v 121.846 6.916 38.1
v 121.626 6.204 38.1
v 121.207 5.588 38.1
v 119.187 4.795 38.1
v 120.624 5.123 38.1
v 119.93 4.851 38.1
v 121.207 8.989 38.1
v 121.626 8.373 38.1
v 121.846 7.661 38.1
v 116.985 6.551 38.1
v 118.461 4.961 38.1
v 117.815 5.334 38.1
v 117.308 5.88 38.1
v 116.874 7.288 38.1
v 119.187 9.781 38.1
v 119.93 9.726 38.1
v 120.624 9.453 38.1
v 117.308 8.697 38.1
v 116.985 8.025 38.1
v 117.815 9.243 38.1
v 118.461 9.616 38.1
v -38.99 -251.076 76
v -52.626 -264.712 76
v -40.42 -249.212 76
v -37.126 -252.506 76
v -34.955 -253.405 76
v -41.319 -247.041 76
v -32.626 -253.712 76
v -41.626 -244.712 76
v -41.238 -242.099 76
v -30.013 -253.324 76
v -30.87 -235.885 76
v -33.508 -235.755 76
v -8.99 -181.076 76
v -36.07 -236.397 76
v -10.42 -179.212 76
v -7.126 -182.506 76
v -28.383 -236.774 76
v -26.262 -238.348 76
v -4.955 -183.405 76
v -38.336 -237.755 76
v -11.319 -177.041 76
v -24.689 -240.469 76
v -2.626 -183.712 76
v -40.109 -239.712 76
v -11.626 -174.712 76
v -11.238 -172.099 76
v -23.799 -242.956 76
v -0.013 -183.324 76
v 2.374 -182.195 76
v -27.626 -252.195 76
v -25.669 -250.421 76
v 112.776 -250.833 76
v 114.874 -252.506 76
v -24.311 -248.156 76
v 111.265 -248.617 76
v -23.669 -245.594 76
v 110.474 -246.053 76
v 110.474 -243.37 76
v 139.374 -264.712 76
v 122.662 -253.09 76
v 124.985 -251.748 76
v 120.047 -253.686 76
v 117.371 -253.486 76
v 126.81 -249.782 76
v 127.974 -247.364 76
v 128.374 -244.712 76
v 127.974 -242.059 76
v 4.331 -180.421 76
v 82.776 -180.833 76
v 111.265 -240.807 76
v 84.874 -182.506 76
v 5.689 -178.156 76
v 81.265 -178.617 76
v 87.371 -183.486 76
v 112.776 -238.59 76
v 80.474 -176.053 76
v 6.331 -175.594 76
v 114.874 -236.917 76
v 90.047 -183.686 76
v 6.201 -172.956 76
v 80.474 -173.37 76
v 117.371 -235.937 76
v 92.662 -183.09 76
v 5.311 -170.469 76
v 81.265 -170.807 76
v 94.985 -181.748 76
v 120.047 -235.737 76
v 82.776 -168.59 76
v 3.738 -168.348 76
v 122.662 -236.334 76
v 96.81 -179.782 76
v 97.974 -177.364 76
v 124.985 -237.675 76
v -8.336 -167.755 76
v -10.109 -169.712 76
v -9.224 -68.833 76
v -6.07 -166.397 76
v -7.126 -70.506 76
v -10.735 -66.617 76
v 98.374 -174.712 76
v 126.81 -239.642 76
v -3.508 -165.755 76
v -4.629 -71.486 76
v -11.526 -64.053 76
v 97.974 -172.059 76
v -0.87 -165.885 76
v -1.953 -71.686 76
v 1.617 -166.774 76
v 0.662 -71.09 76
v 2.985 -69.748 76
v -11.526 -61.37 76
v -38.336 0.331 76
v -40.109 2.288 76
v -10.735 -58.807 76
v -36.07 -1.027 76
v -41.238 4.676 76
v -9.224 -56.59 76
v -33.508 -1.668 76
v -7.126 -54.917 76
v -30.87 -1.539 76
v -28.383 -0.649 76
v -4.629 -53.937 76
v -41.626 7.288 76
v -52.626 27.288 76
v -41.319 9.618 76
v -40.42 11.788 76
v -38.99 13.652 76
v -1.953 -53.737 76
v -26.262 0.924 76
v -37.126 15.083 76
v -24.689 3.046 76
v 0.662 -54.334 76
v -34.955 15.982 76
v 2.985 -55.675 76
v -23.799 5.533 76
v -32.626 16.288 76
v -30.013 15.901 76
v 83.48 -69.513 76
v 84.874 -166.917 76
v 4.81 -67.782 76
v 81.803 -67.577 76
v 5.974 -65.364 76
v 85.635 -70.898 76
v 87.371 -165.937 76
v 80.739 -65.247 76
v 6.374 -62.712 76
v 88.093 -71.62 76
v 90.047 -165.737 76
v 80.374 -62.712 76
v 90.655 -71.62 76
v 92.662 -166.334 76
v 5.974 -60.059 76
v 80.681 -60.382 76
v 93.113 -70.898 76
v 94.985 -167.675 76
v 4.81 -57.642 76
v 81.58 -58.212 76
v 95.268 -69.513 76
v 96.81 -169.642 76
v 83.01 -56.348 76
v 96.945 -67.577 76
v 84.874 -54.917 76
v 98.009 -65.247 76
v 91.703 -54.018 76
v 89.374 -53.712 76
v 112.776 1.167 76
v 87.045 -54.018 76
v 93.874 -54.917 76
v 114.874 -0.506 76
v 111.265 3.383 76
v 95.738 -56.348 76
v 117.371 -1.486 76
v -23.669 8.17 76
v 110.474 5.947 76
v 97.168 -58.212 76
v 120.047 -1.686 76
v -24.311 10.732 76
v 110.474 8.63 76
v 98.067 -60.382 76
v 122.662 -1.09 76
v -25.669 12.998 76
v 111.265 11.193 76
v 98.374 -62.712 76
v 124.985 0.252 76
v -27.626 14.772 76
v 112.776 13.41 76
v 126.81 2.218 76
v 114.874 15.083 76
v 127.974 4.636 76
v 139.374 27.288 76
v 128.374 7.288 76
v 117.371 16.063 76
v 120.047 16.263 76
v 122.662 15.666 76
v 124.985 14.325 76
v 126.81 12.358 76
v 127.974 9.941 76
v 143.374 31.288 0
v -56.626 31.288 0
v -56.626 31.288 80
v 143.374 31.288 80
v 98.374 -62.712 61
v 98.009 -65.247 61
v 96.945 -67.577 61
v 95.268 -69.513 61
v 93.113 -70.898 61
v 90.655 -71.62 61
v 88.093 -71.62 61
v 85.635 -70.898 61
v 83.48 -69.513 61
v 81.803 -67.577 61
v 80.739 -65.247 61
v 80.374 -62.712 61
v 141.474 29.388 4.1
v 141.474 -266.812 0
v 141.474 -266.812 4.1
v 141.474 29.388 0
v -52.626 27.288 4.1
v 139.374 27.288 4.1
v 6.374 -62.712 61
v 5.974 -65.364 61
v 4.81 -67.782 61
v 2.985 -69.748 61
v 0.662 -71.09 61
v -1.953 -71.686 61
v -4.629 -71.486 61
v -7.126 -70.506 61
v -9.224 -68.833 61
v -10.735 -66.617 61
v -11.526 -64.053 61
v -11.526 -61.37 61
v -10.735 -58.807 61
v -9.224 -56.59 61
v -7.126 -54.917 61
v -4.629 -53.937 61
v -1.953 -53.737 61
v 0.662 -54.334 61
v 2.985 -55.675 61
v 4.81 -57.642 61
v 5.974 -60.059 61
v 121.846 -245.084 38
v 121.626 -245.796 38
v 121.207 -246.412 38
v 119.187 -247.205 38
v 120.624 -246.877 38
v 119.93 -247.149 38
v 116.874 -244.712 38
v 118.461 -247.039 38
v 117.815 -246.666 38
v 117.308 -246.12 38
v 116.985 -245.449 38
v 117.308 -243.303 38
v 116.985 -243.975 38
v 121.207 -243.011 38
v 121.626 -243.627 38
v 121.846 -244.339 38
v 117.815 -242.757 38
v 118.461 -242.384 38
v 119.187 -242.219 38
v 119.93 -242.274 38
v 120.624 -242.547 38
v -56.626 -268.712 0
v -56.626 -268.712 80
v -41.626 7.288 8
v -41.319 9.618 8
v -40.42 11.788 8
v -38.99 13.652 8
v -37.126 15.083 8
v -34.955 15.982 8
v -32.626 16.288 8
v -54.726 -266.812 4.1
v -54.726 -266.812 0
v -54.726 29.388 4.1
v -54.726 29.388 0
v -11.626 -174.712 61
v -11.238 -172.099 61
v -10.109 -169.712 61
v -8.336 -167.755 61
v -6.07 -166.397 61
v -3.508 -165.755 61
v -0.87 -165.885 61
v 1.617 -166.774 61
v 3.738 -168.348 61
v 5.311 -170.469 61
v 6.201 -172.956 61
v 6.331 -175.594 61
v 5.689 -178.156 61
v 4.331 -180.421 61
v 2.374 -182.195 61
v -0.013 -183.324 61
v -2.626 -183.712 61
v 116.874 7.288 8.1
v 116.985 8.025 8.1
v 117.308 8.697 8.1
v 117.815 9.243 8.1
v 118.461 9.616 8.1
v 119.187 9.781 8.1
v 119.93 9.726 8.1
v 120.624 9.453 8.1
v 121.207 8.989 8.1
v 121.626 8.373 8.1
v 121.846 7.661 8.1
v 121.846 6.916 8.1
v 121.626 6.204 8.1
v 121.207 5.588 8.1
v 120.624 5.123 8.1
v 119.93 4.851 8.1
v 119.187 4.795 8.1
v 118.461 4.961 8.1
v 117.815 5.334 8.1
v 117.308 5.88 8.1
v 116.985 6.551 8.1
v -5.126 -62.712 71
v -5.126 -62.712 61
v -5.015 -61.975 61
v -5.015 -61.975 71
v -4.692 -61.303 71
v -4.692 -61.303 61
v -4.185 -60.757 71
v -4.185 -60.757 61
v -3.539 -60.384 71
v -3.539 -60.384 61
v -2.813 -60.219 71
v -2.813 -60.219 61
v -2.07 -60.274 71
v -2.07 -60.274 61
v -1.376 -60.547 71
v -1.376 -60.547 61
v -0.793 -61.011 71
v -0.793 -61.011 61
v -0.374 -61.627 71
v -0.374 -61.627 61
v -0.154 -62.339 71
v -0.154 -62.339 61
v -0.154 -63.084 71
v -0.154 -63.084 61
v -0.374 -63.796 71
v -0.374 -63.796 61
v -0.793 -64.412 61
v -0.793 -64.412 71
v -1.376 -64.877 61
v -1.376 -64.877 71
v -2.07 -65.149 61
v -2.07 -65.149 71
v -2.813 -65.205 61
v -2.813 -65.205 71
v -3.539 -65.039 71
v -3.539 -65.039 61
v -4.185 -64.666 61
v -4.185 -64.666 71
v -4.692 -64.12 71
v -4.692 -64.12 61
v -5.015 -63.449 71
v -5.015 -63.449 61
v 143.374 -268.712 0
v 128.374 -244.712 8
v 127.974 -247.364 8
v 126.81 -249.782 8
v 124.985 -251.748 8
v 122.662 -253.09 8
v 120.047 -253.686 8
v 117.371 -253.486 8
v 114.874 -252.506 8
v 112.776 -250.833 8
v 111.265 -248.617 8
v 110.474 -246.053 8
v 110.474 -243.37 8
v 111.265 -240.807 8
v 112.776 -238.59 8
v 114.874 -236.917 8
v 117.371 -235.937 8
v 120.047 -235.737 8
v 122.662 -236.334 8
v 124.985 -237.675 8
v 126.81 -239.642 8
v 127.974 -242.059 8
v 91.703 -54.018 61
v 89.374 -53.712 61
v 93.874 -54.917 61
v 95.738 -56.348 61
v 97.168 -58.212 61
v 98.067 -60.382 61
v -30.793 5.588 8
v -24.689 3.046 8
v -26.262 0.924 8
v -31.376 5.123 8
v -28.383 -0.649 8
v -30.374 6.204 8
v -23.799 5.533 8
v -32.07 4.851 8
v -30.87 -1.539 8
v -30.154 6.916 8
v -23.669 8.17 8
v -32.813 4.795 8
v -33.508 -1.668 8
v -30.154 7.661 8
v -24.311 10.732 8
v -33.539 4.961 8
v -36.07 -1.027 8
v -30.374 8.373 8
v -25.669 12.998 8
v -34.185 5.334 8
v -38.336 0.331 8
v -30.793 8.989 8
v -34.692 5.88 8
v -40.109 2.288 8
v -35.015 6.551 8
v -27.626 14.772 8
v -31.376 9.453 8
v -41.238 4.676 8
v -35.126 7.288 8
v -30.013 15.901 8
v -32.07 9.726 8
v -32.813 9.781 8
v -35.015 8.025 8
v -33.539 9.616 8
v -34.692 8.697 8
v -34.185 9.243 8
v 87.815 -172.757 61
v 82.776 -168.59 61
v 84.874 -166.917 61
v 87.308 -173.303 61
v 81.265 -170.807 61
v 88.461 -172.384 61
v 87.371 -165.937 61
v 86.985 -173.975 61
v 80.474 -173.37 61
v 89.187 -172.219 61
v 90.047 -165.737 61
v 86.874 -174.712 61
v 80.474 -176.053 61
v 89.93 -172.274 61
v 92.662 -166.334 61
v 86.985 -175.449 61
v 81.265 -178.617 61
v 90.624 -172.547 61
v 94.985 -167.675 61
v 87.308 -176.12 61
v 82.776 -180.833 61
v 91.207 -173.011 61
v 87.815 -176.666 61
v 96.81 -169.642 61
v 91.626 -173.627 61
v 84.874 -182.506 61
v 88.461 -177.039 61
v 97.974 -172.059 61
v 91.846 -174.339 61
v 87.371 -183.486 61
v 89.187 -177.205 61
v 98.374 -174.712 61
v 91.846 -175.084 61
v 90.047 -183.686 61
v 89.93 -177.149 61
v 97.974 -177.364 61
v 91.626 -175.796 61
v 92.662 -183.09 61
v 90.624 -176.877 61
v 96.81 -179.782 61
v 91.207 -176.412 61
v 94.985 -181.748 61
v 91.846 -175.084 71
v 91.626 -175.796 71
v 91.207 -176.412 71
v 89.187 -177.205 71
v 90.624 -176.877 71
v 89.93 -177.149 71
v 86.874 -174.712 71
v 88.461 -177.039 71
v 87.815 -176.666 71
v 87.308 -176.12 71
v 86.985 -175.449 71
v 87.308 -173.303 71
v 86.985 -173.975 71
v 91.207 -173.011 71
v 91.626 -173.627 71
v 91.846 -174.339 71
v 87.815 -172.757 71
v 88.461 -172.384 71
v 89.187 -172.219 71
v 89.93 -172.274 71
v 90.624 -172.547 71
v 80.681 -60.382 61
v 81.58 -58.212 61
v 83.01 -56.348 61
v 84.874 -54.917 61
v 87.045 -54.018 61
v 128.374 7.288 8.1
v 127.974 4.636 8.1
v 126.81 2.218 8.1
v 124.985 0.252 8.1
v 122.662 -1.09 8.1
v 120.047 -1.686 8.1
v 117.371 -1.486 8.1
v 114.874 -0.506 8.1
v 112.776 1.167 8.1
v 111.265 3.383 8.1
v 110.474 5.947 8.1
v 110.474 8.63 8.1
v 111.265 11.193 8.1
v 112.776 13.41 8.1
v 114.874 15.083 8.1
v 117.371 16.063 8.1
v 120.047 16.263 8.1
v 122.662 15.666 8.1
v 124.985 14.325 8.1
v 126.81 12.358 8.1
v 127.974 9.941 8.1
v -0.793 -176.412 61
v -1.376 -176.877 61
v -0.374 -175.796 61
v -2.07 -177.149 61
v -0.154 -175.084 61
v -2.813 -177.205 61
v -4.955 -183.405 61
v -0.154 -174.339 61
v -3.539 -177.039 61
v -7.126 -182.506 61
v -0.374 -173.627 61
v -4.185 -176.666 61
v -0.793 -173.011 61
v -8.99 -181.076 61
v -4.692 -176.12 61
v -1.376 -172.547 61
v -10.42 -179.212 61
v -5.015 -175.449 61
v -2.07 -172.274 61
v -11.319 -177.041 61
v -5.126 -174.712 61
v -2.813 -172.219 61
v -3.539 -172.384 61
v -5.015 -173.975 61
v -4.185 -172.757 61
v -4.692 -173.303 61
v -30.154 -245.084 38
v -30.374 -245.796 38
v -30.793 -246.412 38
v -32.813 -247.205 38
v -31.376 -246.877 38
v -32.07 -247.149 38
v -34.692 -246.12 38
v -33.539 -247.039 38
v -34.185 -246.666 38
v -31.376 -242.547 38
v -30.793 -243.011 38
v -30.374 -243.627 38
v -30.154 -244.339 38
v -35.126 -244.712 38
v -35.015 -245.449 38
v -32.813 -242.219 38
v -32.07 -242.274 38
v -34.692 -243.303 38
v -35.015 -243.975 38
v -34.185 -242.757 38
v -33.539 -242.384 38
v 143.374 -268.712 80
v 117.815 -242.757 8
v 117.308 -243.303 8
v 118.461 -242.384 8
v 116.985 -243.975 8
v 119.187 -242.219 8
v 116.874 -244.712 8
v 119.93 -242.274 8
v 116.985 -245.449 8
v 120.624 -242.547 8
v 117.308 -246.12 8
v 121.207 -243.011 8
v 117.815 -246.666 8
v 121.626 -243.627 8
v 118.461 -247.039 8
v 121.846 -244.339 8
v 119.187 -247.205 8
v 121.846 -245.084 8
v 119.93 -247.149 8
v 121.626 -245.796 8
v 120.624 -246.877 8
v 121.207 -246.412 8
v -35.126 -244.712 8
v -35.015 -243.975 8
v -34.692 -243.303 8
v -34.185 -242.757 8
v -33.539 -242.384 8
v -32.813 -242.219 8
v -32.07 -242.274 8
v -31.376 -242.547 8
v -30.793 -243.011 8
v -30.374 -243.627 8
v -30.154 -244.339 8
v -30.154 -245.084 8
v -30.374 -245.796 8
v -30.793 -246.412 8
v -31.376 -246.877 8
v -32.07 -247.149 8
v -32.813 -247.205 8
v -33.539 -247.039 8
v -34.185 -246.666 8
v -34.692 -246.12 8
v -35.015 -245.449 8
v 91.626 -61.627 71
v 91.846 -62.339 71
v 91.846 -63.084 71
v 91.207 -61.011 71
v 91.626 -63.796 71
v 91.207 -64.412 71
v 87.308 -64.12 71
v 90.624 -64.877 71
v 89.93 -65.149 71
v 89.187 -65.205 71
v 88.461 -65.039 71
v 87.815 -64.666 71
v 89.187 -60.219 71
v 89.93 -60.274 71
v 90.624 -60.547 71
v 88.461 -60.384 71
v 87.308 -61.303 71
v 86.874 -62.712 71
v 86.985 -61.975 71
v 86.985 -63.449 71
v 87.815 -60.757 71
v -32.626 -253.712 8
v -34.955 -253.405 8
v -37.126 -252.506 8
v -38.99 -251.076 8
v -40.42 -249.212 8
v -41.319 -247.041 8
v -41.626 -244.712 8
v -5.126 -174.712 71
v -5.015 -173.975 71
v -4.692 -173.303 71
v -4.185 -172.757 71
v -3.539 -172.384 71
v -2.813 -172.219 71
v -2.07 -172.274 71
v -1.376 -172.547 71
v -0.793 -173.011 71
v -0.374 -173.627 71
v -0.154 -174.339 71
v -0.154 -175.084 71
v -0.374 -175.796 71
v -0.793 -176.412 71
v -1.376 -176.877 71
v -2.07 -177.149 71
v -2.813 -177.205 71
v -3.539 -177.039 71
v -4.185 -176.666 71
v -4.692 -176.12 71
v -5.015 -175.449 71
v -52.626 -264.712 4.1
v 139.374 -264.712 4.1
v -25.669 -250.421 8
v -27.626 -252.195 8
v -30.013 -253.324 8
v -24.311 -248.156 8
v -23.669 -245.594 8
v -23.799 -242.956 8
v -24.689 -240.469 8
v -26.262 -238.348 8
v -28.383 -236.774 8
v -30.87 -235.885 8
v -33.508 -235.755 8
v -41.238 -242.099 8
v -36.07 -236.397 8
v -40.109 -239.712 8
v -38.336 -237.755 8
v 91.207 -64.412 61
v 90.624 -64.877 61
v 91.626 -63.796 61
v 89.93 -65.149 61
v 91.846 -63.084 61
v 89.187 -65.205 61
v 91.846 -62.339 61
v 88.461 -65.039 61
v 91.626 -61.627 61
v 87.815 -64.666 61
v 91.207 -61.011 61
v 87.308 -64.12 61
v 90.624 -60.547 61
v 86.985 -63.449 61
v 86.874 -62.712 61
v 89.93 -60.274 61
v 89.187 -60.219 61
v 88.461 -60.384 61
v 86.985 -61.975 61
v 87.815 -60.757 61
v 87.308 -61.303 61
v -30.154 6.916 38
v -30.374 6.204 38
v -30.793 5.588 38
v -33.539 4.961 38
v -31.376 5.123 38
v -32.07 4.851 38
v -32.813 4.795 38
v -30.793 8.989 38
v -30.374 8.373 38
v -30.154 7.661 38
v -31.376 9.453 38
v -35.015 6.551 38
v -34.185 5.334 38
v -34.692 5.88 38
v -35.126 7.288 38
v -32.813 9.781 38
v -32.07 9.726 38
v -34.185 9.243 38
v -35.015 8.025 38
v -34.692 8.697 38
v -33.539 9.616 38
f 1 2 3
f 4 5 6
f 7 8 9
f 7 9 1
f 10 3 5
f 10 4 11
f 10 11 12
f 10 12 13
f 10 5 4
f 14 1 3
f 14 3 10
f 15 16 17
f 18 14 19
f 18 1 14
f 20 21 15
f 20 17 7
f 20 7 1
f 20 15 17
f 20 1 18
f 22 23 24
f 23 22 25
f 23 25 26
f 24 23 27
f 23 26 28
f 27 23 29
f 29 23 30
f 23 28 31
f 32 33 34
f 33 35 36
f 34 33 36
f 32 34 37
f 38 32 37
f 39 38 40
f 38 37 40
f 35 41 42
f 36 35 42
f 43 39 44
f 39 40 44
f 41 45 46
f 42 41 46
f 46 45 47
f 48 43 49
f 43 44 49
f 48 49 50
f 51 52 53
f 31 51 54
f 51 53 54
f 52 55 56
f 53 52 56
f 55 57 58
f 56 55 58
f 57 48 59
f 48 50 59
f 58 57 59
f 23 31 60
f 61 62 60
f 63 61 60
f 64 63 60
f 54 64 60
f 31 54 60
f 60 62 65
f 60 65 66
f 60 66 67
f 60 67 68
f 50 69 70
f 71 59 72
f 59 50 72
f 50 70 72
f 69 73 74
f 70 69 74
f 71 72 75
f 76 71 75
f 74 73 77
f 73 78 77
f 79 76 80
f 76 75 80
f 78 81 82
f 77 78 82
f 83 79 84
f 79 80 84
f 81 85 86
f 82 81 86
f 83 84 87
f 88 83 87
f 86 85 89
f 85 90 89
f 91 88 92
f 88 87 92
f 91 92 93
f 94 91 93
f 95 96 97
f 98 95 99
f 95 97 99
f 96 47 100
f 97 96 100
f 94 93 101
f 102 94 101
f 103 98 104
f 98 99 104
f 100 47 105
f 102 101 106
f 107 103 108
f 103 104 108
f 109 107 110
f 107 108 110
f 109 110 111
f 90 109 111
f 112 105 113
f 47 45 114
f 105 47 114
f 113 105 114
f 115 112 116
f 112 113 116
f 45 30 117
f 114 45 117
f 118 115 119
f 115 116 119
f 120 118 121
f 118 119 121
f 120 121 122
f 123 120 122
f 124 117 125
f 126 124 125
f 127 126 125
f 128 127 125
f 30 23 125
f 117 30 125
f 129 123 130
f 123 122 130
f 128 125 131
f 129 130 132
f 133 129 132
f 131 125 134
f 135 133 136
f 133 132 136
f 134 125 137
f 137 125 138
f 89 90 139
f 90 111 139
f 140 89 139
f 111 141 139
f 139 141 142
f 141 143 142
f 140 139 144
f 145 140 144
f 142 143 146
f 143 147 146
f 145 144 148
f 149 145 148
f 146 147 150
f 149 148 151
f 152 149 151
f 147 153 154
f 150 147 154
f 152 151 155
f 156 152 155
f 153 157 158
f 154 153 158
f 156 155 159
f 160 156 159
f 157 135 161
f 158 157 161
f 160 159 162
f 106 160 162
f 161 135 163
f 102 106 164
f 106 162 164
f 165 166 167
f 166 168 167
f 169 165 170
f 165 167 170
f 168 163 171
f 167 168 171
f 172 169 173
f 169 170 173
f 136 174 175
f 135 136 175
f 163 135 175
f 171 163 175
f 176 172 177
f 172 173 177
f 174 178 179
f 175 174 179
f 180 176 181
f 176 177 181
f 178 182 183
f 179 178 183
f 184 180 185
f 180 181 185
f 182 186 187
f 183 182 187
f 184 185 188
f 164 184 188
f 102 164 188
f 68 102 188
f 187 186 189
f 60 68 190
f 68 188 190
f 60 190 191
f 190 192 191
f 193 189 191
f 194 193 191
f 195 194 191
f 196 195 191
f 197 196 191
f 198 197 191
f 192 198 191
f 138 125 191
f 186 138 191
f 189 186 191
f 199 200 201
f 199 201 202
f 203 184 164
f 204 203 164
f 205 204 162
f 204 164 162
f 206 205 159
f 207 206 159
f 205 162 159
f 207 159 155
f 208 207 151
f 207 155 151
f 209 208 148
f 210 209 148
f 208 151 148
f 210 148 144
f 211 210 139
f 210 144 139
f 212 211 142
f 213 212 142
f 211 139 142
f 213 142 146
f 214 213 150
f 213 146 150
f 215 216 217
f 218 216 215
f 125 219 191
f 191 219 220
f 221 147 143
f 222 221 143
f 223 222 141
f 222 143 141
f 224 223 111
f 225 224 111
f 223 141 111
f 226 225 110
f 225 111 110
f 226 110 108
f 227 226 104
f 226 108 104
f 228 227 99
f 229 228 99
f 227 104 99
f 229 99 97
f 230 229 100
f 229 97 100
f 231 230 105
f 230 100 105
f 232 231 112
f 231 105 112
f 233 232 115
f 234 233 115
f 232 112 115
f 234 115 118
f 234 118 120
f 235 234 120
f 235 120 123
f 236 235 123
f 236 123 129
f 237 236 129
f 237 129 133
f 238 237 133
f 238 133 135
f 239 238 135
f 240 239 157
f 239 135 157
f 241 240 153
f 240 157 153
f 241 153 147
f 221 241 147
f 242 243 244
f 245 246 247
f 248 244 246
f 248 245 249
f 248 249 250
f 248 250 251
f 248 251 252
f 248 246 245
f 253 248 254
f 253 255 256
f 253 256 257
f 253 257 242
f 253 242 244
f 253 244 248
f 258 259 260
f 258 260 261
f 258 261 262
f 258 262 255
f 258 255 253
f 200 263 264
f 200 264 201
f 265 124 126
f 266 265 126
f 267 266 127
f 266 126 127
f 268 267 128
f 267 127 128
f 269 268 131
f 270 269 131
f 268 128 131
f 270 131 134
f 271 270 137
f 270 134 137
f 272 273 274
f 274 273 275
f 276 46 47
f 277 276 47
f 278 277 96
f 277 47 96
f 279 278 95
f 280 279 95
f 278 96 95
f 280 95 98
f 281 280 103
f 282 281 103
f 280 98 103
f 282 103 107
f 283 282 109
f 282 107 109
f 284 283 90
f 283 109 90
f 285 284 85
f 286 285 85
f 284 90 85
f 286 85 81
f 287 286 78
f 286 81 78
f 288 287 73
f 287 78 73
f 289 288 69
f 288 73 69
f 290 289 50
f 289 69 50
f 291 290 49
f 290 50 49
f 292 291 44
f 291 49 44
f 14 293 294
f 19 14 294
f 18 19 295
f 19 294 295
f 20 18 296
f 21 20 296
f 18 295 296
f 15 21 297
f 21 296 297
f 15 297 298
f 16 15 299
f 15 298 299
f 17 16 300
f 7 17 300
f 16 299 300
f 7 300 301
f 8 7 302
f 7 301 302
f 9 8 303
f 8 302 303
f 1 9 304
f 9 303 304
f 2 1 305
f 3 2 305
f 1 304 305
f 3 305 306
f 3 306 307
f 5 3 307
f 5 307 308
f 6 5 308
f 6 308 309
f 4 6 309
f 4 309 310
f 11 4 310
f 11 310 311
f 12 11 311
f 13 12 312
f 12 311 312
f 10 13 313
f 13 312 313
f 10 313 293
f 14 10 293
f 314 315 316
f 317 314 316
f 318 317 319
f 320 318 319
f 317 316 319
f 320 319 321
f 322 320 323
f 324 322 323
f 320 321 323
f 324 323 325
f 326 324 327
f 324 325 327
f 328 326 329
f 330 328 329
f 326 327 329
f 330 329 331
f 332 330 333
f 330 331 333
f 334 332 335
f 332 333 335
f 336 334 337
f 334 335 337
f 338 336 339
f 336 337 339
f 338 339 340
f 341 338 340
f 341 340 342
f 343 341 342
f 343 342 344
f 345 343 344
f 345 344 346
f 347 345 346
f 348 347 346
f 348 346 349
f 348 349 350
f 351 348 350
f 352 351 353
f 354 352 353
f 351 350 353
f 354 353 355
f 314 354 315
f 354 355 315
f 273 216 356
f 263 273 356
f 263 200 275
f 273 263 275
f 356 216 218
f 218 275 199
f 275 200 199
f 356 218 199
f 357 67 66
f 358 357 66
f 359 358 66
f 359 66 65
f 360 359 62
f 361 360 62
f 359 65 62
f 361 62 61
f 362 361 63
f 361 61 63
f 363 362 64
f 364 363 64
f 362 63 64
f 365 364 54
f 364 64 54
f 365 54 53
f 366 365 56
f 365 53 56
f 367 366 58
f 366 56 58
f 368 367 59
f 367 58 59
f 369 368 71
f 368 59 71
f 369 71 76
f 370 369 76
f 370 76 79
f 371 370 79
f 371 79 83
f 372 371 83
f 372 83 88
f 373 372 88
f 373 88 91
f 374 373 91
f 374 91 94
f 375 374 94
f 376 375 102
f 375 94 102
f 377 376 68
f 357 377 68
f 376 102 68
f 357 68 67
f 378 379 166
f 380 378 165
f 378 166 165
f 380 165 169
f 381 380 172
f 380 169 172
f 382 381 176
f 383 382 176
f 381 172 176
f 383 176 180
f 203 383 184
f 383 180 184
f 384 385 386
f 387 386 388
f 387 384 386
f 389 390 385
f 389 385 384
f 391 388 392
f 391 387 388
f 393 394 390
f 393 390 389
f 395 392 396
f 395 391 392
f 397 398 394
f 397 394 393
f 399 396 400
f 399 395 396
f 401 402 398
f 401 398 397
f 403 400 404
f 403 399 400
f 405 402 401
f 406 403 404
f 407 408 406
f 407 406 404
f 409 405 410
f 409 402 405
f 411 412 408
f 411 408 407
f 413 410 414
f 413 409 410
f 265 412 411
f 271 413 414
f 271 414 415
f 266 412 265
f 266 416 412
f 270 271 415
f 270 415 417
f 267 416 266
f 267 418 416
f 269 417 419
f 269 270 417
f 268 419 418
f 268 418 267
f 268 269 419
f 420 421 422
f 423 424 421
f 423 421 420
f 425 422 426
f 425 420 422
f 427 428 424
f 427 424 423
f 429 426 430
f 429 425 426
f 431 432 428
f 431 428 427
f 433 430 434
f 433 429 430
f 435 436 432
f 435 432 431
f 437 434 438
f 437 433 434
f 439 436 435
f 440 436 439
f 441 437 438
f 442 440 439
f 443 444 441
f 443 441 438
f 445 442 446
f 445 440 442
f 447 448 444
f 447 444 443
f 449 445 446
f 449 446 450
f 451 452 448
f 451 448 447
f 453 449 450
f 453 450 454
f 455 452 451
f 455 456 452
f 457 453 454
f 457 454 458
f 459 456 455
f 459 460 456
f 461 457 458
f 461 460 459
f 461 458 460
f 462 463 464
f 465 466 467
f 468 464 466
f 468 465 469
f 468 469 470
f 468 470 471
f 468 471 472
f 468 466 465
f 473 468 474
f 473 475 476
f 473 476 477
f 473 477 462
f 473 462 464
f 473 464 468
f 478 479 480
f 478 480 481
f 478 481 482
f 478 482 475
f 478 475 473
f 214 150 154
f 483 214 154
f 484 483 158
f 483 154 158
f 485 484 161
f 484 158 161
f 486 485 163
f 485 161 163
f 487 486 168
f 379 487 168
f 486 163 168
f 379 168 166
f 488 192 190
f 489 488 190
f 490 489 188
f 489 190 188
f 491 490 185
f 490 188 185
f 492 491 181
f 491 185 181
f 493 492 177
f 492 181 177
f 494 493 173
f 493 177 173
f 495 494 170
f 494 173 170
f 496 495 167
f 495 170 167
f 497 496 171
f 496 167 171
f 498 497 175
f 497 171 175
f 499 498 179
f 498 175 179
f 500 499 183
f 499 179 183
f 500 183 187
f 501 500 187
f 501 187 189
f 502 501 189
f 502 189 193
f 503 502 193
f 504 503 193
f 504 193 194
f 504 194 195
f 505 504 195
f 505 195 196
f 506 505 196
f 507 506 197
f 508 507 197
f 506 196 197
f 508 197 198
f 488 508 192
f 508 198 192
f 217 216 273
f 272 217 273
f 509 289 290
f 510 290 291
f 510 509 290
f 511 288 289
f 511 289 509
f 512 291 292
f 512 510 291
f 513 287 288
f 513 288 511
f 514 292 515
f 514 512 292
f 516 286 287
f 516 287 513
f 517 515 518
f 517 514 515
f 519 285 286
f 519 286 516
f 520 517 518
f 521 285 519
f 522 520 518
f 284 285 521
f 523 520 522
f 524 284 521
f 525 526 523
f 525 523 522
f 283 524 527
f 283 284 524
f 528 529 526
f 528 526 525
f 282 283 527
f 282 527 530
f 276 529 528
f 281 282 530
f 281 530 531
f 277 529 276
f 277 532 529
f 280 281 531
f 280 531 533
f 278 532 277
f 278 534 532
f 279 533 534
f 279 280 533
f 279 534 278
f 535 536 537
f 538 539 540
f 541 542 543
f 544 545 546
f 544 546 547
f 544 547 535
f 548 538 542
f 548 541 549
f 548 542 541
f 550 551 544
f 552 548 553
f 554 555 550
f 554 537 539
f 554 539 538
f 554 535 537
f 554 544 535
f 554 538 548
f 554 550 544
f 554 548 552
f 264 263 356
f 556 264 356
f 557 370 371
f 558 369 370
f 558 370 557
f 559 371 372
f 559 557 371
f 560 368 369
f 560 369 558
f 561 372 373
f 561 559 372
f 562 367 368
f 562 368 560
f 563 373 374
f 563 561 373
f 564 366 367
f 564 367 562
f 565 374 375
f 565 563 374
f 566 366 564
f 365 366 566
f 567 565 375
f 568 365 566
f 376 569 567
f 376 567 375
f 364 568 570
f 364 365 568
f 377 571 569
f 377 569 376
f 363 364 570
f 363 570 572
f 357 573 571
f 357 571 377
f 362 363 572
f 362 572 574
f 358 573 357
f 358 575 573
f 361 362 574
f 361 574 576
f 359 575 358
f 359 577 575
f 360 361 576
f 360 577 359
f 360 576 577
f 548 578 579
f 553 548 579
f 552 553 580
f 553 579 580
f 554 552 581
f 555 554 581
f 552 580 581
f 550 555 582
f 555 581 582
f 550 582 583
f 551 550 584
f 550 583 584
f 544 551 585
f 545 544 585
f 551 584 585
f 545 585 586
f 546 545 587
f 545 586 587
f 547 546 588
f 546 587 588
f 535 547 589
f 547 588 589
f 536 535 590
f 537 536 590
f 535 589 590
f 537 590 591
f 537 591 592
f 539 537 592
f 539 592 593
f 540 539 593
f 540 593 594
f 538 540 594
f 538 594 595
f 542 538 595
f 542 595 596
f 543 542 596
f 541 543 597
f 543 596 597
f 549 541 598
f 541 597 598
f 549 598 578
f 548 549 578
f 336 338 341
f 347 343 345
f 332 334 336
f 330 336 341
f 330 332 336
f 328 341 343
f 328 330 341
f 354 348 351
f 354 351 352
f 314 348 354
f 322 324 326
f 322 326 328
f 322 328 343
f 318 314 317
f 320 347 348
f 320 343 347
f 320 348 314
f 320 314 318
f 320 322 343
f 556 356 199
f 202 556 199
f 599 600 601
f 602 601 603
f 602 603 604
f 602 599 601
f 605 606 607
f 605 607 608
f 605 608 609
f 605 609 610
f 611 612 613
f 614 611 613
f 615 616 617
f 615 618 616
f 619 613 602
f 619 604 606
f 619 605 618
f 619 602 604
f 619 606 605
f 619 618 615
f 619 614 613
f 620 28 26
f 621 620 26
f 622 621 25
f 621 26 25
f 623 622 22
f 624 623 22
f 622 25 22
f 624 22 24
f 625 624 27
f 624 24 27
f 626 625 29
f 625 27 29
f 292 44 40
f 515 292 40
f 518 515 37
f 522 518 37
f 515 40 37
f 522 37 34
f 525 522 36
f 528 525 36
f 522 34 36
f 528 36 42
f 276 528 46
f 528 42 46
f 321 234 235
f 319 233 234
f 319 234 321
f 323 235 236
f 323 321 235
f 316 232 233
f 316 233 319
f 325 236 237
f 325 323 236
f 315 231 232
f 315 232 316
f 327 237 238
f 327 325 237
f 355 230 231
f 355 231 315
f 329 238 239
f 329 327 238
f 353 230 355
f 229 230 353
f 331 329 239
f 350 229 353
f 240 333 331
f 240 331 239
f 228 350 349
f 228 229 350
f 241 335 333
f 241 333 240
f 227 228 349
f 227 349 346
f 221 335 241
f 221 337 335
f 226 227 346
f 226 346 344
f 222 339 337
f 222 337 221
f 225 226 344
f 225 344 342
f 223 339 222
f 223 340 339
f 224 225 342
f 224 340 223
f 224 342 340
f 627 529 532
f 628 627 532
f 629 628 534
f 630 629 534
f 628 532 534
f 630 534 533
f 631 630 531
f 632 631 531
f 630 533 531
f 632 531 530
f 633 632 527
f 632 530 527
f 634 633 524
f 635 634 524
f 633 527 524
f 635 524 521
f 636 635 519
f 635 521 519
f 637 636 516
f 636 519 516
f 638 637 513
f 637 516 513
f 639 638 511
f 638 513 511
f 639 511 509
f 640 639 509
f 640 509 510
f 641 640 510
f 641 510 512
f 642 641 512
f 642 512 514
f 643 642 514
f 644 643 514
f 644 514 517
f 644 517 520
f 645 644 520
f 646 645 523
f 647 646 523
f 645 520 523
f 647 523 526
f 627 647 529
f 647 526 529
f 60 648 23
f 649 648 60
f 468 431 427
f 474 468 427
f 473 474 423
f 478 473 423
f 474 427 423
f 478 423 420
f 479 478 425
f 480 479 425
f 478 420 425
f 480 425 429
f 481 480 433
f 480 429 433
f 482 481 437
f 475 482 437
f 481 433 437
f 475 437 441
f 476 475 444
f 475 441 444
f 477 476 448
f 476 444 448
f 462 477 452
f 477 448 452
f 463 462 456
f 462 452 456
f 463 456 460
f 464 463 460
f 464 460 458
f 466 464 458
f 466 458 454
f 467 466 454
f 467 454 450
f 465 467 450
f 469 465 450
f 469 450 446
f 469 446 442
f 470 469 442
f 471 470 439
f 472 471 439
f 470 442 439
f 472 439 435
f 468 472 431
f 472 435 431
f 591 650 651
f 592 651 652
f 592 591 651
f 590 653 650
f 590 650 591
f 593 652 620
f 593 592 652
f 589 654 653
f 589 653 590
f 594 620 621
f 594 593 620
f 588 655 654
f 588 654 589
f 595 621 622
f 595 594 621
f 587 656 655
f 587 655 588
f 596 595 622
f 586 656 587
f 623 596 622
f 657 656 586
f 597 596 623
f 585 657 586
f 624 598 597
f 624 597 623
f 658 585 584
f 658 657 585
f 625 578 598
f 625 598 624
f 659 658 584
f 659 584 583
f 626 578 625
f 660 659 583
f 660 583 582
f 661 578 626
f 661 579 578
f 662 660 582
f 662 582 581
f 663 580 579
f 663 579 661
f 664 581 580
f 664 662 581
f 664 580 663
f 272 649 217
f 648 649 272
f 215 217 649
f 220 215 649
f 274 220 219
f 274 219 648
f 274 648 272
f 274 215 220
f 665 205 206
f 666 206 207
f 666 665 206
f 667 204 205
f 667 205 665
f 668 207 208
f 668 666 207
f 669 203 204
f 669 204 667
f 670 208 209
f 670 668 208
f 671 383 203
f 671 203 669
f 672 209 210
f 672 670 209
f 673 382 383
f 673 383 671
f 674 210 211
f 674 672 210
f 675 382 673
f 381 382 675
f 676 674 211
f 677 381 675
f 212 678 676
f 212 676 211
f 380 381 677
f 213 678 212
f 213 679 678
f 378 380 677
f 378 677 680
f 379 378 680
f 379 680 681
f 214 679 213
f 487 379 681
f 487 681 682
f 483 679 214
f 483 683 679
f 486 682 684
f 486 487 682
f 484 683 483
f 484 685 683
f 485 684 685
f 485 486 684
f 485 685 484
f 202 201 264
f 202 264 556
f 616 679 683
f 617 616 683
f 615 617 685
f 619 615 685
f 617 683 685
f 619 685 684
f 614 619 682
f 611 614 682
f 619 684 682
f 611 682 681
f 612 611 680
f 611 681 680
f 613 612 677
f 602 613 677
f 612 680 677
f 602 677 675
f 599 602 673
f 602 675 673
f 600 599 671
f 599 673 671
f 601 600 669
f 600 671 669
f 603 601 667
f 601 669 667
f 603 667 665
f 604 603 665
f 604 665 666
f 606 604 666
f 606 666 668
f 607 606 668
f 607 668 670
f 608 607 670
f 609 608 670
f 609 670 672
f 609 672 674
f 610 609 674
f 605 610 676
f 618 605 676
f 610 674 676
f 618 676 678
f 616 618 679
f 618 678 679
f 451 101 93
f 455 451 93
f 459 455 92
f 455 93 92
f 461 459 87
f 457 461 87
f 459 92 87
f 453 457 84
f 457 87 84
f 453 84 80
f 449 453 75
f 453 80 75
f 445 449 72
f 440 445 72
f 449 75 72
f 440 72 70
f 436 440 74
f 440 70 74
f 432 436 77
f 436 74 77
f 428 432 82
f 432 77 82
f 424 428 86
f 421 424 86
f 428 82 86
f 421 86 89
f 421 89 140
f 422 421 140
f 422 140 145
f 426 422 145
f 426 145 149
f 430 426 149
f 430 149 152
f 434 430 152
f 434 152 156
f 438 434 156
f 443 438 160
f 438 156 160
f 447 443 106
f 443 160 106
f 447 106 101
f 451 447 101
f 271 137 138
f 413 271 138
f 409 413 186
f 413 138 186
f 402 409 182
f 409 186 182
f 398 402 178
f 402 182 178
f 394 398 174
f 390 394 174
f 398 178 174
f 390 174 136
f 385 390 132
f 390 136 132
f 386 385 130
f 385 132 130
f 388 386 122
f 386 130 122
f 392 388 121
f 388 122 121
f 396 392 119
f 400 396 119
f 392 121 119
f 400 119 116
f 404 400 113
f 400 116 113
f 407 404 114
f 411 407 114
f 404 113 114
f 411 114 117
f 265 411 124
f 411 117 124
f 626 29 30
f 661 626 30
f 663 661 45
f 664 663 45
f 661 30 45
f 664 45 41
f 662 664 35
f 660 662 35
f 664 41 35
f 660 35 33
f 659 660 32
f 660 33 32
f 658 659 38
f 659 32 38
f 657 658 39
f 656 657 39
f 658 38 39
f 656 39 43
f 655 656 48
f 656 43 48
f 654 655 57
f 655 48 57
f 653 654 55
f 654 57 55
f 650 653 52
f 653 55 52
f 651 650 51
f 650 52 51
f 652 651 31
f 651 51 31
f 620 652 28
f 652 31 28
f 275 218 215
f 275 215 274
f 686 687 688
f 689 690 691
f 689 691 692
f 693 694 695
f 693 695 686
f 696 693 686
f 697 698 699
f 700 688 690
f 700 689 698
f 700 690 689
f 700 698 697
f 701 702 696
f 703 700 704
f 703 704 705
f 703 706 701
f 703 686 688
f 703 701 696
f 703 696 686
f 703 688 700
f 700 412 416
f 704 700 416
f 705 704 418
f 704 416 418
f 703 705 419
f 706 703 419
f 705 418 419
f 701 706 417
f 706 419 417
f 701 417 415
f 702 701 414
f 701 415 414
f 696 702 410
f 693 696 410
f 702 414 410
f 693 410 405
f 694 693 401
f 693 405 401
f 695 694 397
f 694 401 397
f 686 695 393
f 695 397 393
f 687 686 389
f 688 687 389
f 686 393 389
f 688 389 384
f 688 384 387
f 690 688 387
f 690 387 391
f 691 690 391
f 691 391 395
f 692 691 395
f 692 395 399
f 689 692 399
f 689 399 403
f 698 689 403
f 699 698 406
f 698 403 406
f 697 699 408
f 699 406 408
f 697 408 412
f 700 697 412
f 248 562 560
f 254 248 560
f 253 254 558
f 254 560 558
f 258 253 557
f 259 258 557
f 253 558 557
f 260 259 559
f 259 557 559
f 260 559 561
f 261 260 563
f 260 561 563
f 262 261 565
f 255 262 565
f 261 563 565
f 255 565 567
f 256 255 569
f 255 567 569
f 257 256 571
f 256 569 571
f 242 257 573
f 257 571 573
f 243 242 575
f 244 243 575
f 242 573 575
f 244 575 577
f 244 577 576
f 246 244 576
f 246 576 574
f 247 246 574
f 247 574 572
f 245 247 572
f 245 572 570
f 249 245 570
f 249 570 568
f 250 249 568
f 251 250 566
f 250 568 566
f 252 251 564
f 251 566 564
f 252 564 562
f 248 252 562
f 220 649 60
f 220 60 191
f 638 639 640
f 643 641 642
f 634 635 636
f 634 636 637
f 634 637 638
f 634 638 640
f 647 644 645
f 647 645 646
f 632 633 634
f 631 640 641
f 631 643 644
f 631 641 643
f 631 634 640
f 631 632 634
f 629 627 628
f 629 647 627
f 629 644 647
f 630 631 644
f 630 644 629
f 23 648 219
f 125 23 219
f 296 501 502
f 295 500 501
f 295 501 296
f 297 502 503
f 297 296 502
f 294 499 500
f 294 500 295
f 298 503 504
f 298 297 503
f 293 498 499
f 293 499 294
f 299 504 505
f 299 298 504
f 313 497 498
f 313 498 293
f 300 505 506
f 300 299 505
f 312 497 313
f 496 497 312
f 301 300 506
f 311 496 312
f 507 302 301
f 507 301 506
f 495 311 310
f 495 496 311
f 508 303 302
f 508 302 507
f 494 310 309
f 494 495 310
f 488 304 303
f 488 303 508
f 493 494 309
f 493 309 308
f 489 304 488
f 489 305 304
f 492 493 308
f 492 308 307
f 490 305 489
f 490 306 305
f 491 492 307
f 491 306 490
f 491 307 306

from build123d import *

# Parameters (mm, degrees)
ESQUISSE1_W             = 200
ESQUISSE1_H             = 300
BOSS_EXTRU_1_DEPTH      = 80
COQUE1_T                = -4
ESQUISSE3_W             = 196.2
ESQUISSE3_H             = 296.2
ENL_V_MAT_EXTRU_2_DEPTH = 4.1
ESQUISSE4_R             = 9
BOSS_EXTRU_2_DEPTH      = 67.9
ESQUISSE5_R             = 2.5
ENL_V_MAT_EXTRU_3_DEPTH = 30
ESQUISSE4_4_R           = 9
BOSS_EXTRU_3_DEPTH      = 15
ESQUISSE6_R             = 2.5
ENL_V_MAT_EXTRU_6_DEPTH = 10
ESQUISSE8_R             = 9
BOSS_EXTRU_5_DEPTH      = 68
ESQUISSE9_R             = 2.5
ENL_V_MAT_EXTRU_8_DEPTH = 30


with BuildPart() as part:
    # Esquisse1 → Boss.-Extru.1 (new body)
    with BuildSketch(Plane.XY):
        with Locations((43.373964051, -118.711656442)):
            Rectangle(ESQUISSE1_W, ESQUISSE1_H)
    extrude(amount=BOSS_EXTRU_1_DEPTH)

    # Coque1
    coque1_openings = [part.faces().sort_by_distance(p)[0] for p in [
        (43.373964051, -118.711656442, 0),
    ]]
    offset(amount=COQUE1_T, openings=coque1_openings, kind=Kind.INTERSECTION)

    # Esquisse3 → Enlèv. mat.-Extru.2 (cut)
    with BuildSketch(Plane(origin=(0, 0, 0), x_dir=(-1, 0, 0), z_dir=(0, 0, -1))):
        with Locations((-43.373964051, -118.711656442)):
            Rectangle(ESQUISSE3_W, ESQUISSE3_H)
    extrude(amount=-ENL_V_MAT_EXTRU_2_DEPTH, mode=Mode.SUBTRACT)

    # Esquisse4 → Boss.-Extru.2 (add)
    with BuildSketch(Plane(origin=(0, 0, 76), x_dir=(-1, 0, 0), z_dir=(0, 0, -1))):
        with Locations((-119.373964051, 7.288343558)):
            Circle(ESQUISSE4_R)
    extrude(amount=BOSS_EXTRU_2_DEPTH)

    # Esquisse5 → Enlèv. mat.-Extru.3 (cut)
    with BuildSketch(Plane(origin=(0, 0, 8.1), x_dir=(-1, 0, 0), z_dir=(0, 0, -1))):
        with Locations((-119.373964051, 7.288343558)):
            Circle(ESQUISSE5_R)
    extrude(amount=-ENL_V_MAT_EXTRU_3_DEPTH, mode=Mode.SUBTRACT)

    # Esquisse4<4> → Boss.-Extru.3 (add)
    with BuildSketch(Plane(origin=(0, 0, 76), x_dir=(-1, 0, 0), z_dir=(0, 0, -1))):
        with Locations((2.626035949, -174.711656442)):
            Circle(ESQUISSE4_4_R)
        with Locations((-89.373964051, -174.711656442)):
            Circle(ESQUISSE4_4_R)
        with Locations((-89.373964051, -62.711656442)):
            Circle(ESQUISSE4_4_R)
        with Locations((2.626035949, -62.711656442)):
            Circle(ESQUISSE4_4_R)
    extrude(amount=BOSS_EXTRU_3_DEPTH)

    # Esquisse6 → Enlèv. mat.-Extru.6 (cut)
    with BuildSketch(Plane(origin=(0, 0, 61), x_dir=(-1, 0, 0), z_dir=(0, 0, -1))):
        with Locations((-89.373964051, -62.711656442)):
            Circle(ESQUISSE6_R)
        with Locations((2.626035949, -62.711656442)):
            Circle(ESQUISSE6_R)
        with Locations((-89.373964051, -174.711656442)):
            Circle(ESQUISSE6_R)
        with Locations((2.626035949, -174.711656442)):
            Circle(ESQUISSE6_R)
    extrude(amount=-ENL_V_MAT_EXTRU_6_DEPTH, mode=Mode.SUBTRACT)

    # Esquisse8 → Boss.-Extru.5 (add)
    with BuildSketch(Plane(origin=(0, 0, 76), x_dir=(-1, 0, 0), z_dir=(0, 0, -1))):
        with Locations((32.626035949, 7.288343558)):
            Circle(ESQUISSE8_R)
        with Locations((32.626035949, -244.711656442)):
            Circle(ESQUISSE8_R)
        with Locations((-119.373964051, -244.711656442)):
            Circle(ESQUISSE8_R)
    extrude(amount=BOSS_EXTRU_5_DEPTH)

    # Esquisse9 → Enlèv. mat.-Extru.8 (cut)
    with BuildSketch(Plane(origin=(0, 0, 8), x_dir=(-1, 0, 0), z_dir=(0, 0, -1))):
        with Locations((32.626035949, 7.288343558)):
            Circle(ESQUISSE9_R)
        with Locations((32.626035949, -244.711656442)):
            Circle(ESQUISSE9_R)
        with Locations((-119.373964051, -244.711656442)):
            Circle(ESQUISSE9_R)
    extrude(amount=-ENL_V_MAT_EXTRU_8_DEPTH, mode=Mode.SUBTRACT)


solid = part.part
